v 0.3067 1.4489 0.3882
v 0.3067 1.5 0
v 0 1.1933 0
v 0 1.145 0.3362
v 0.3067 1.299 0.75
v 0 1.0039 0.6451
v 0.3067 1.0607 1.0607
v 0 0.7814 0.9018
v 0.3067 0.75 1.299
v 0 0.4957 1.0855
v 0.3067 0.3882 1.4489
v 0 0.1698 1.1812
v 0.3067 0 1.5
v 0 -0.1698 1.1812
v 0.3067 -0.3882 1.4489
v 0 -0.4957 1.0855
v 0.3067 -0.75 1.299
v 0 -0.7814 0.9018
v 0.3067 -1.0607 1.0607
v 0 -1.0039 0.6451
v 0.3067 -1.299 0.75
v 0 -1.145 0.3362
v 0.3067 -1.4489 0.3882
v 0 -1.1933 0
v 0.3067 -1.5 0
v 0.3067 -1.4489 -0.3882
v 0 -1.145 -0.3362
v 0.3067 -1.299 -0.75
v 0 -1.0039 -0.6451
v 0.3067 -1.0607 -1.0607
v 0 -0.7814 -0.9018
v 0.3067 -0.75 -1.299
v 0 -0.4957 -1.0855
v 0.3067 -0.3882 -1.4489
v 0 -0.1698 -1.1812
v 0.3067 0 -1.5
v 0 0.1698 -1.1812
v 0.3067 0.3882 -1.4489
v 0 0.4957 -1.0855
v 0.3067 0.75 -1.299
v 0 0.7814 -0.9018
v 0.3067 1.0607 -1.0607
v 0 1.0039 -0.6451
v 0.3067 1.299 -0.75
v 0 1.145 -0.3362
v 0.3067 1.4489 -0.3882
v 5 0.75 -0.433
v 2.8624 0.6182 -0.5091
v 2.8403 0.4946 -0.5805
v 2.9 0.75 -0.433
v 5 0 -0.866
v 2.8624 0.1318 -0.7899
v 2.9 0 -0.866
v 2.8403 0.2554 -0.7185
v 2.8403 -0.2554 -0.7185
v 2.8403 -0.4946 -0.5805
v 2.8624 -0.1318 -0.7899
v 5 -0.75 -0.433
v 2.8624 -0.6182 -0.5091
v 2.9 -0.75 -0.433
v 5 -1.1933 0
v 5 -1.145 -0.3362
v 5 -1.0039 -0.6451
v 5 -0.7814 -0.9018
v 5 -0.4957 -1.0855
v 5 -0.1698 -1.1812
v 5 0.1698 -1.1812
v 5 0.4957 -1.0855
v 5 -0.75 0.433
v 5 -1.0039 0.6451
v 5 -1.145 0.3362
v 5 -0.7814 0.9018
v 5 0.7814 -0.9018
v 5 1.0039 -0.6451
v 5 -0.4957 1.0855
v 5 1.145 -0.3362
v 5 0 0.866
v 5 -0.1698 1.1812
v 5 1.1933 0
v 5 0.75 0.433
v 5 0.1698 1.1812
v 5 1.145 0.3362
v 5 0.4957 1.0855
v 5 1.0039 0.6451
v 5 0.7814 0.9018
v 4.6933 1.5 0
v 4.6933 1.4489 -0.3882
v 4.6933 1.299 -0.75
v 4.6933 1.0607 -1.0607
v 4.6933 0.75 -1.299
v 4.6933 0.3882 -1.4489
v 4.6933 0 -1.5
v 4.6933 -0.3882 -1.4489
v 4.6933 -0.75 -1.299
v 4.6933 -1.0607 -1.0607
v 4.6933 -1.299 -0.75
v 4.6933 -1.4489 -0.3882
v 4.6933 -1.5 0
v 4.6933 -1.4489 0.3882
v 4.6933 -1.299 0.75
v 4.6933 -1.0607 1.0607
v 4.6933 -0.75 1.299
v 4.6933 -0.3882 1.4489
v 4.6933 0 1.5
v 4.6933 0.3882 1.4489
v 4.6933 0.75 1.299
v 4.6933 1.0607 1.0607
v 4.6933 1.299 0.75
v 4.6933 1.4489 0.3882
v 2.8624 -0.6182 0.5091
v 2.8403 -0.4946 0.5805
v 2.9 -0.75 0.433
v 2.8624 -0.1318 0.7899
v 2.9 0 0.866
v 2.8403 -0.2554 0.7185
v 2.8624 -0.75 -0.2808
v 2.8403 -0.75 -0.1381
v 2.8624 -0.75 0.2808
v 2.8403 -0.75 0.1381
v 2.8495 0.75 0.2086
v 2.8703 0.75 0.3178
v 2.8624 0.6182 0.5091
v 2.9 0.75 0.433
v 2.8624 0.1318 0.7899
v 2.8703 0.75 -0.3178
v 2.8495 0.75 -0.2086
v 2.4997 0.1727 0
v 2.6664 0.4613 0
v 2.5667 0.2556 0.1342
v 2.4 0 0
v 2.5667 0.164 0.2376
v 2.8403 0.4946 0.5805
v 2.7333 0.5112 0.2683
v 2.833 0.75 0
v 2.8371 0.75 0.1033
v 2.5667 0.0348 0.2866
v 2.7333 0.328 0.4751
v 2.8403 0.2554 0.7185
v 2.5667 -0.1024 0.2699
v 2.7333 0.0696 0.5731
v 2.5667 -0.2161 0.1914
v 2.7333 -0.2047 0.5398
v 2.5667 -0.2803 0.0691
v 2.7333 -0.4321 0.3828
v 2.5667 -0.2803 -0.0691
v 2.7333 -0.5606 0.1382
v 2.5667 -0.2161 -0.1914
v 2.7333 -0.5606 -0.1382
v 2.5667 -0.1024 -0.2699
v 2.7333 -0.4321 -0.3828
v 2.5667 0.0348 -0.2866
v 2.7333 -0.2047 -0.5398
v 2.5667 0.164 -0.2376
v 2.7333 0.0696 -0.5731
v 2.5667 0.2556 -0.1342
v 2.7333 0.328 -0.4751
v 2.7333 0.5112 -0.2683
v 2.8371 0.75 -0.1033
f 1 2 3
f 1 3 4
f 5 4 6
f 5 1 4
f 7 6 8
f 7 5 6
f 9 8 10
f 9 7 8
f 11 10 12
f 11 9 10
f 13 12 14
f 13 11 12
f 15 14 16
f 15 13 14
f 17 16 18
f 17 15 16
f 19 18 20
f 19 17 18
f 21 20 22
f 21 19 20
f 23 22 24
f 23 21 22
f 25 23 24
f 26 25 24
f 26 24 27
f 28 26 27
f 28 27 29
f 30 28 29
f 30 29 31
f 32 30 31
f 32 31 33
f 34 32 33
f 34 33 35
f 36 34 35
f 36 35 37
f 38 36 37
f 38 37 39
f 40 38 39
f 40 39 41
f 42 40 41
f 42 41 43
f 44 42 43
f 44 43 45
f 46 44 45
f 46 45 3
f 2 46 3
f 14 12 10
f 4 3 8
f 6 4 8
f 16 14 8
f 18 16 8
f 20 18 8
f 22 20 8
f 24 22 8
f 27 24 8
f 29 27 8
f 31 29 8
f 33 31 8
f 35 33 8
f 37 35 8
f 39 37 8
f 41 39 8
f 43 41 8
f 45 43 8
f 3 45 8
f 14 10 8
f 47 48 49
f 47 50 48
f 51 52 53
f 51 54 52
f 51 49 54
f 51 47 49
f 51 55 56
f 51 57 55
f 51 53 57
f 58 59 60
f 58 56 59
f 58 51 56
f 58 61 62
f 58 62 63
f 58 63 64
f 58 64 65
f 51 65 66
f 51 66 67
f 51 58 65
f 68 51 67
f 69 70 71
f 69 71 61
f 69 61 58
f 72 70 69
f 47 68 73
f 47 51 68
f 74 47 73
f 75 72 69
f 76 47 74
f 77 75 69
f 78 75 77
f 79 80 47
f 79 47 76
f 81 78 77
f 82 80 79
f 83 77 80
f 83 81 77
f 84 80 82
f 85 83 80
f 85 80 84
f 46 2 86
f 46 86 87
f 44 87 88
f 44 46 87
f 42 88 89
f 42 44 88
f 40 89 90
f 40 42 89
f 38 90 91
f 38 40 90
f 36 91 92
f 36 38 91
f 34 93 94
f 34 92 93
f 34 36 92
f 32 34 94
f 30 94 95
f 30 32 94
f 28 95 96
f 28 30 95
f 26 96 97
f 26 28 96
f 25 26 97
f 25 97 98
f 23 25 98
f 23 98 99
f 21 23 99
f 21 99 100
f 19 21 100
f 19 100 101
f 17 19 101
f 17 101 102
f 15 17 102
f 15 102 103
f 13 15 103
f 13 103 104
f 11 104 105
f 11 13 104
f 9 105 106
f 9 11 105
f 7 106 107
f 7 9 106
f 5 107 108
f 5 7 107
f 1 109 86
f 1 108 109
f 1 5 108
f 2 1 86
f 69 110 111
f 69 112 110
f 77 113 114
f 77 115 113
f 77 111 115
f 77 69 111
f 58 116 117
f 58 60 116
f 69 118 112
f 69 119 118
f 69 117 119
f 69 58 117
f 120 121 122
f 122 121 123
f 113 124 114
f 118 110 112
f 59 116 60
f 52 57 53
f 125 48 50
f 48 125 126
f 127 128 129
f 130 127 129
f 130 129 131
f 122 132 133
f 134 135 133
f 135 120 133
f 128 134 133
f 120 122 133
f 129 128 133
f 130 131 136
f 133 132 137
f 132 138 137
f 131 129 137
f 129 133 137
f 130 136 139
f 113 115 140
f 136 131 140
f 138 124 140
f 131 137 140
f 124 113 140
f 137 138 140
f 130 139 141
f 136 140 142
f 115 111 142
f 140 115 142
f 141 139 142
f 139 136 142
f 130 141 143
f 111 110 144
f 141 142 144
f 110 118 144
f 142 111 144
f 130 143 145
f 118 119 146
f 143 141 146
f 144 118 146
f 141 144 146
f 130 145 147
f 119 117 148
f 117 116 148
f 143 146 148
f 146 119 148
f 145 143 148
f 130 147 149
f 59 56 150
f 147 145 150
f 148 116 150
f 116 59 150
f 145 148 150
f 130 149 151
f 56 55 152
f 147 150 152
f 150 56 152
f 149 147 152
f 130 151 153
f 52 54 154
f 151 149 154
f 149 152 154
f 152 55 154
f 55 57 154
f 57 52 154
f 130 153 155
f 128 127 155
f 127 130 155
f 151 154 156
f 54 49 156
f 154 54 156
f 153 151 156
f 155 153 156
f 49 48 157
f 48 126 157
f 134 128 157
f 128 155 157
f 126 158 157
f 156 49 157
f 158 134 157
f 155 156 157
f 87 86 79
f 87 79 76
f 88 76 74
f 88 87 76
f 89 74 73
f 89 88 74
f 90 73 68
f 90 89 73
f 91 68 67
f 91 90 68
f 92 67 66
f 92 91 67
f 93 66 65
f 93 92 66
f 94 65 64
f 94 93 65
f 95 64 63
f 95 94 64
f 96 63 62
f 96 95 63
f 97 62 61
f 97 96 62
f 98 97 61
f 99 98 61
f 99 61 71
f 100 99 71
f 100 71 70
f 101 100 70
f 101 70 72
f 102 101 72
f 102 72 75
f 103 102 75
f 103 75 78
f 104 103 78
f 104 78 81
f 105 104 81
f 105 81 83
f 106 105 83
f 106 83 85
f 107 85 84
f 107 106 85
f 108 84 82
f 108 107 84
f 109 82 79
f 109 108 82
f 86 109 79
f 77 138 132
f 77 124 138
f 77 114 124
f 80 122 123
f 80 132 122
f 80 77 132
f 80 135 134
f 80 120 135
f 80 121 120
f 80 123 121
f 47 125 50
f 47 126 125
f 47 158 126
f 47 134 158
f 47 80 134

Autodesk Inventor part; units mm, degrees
ref_plane "YZ Plane" through (0, 0, 0) normal (1, 0, 0) x (0, 1, 0)
ref_plane "XZ Plane" through (0, 0, 0) normal (0, 1, 0) x (-1, 0, 0)
sketch "Sketch1" plane through (0, 0, 0) normal (0, 0, 1) x (1, 0, 0)
  line L0 (0, 0) -> (2.4, 0)
  line L1 (5, 0.866) -> (5, 1.5)
  line L2 (5, 1.5) -> (0, 1.5)
  line L3 (5, 0.866) -> (2.9, 0.866)
  line L4 (2.9, 0.866) -> (2.4, 0)
  line L5 (0, -0.3) -> (0, 1.8) projected
  line L6 (0, 1.5) -> (0, 0)
  dimension "d0" = 2.1
  dimension "d1" = 60
  dimension "d2" = 3
  dimension "d3" = 1.7321
  dimension "d5" = 5
revolve "Body" add sketch "Sketch1" angle 360 about axis through (0, 0, 0) along (1, 0, 0)
chamfer "Chamfer1" distance 0.3067 angle 45 1 edges at (5, -1.5, 0) measured on face at (5, 1.2658, -0.1887)
sketch "Sketch2" plane through (5, 0, 0) normal (1, 0, 0) x (0, 0, -1)
  circle A0 centre (0, 0) radius 0.866 projected
  line L0 (-0.433, 0.75) -> (0.433, 0.75)
  line L1 (0.433, 0.75) -> (0.866, 0)
  line L2 (0.866, 0) -> (0.433, -0.75)
  line L3 (0.433, -0.75) -> (-0.433, -0.75)
  line L4 (-0.433, -0.75) -> (-0.866, 0)
  line L5 (-0.866, 0) -> (-0.433, 0.75)
extrude "Slot" add sketch "Sketch2" against normal up to next contours L1 A0 | A0 L2 | L0 A0 | A0 L3 | L5 A0 | A0 L4
thread "Thread" size "M3x0.5" class "6g" standard "ANSI Metric M Profile" length 5
chamfer "Chamfer2" distance 0.3067 angle 45 1 edges at (0, -1.5, 0) measured on face at (1.5644, 1.4951, -0.1207)
ref_plane "Work Plane1" through (2.5, 0, 0) normal (0, 0.5, 0.866) x (1, 0, 0)
equation "\"d0\" = INTI"
equation "\"d2\" = NND"
equation "\"d3\" = 1.1547 * SW"
equation "\"d5\" = NLG"
equation "\"d7\" = -0.5 * GD1 + 0.5 * NND"
equation "\"d8\" = FAWI"
equation "\"d29\" = -0.5 * GD1 + 0.5 * NND"
equation "\"d11\" = NLG"
equation "\"d13\" = -0.5 * GD1 + 0.5 * NND"
equation "\"d14\" = FAWI"
equation "\"d30\" = -0.5 * GD1 + 0.5 * NND"
equation "\"NND\" = 3"
equation "\"NLG\" = 5"
equation "\"INTI\" = 2.1"
equation "\"FAWI\" = 45deg"
equation "\"SW\" = 1.5"
equation "\"GD1\" = THREADDIA - 1.2269 * PTC"
equation "\"FAWI1\" = 45deg"
equation "\"GUL\" = 0.61345 * PTC"
equation "\"SPD\" = 2"
equation "\"TOA\" = 30deg"
equation "\"THREADDIA\" = 3"
equation "\"PTC\" = 0.5"
equation "\"GAL\" = 0.61345 * PTC"
equation "\"E0\" = 1.155 * SW"
properties part number "ANSI B18.3.6M - M3x0.5 x 5" material "Steel, Mild"
